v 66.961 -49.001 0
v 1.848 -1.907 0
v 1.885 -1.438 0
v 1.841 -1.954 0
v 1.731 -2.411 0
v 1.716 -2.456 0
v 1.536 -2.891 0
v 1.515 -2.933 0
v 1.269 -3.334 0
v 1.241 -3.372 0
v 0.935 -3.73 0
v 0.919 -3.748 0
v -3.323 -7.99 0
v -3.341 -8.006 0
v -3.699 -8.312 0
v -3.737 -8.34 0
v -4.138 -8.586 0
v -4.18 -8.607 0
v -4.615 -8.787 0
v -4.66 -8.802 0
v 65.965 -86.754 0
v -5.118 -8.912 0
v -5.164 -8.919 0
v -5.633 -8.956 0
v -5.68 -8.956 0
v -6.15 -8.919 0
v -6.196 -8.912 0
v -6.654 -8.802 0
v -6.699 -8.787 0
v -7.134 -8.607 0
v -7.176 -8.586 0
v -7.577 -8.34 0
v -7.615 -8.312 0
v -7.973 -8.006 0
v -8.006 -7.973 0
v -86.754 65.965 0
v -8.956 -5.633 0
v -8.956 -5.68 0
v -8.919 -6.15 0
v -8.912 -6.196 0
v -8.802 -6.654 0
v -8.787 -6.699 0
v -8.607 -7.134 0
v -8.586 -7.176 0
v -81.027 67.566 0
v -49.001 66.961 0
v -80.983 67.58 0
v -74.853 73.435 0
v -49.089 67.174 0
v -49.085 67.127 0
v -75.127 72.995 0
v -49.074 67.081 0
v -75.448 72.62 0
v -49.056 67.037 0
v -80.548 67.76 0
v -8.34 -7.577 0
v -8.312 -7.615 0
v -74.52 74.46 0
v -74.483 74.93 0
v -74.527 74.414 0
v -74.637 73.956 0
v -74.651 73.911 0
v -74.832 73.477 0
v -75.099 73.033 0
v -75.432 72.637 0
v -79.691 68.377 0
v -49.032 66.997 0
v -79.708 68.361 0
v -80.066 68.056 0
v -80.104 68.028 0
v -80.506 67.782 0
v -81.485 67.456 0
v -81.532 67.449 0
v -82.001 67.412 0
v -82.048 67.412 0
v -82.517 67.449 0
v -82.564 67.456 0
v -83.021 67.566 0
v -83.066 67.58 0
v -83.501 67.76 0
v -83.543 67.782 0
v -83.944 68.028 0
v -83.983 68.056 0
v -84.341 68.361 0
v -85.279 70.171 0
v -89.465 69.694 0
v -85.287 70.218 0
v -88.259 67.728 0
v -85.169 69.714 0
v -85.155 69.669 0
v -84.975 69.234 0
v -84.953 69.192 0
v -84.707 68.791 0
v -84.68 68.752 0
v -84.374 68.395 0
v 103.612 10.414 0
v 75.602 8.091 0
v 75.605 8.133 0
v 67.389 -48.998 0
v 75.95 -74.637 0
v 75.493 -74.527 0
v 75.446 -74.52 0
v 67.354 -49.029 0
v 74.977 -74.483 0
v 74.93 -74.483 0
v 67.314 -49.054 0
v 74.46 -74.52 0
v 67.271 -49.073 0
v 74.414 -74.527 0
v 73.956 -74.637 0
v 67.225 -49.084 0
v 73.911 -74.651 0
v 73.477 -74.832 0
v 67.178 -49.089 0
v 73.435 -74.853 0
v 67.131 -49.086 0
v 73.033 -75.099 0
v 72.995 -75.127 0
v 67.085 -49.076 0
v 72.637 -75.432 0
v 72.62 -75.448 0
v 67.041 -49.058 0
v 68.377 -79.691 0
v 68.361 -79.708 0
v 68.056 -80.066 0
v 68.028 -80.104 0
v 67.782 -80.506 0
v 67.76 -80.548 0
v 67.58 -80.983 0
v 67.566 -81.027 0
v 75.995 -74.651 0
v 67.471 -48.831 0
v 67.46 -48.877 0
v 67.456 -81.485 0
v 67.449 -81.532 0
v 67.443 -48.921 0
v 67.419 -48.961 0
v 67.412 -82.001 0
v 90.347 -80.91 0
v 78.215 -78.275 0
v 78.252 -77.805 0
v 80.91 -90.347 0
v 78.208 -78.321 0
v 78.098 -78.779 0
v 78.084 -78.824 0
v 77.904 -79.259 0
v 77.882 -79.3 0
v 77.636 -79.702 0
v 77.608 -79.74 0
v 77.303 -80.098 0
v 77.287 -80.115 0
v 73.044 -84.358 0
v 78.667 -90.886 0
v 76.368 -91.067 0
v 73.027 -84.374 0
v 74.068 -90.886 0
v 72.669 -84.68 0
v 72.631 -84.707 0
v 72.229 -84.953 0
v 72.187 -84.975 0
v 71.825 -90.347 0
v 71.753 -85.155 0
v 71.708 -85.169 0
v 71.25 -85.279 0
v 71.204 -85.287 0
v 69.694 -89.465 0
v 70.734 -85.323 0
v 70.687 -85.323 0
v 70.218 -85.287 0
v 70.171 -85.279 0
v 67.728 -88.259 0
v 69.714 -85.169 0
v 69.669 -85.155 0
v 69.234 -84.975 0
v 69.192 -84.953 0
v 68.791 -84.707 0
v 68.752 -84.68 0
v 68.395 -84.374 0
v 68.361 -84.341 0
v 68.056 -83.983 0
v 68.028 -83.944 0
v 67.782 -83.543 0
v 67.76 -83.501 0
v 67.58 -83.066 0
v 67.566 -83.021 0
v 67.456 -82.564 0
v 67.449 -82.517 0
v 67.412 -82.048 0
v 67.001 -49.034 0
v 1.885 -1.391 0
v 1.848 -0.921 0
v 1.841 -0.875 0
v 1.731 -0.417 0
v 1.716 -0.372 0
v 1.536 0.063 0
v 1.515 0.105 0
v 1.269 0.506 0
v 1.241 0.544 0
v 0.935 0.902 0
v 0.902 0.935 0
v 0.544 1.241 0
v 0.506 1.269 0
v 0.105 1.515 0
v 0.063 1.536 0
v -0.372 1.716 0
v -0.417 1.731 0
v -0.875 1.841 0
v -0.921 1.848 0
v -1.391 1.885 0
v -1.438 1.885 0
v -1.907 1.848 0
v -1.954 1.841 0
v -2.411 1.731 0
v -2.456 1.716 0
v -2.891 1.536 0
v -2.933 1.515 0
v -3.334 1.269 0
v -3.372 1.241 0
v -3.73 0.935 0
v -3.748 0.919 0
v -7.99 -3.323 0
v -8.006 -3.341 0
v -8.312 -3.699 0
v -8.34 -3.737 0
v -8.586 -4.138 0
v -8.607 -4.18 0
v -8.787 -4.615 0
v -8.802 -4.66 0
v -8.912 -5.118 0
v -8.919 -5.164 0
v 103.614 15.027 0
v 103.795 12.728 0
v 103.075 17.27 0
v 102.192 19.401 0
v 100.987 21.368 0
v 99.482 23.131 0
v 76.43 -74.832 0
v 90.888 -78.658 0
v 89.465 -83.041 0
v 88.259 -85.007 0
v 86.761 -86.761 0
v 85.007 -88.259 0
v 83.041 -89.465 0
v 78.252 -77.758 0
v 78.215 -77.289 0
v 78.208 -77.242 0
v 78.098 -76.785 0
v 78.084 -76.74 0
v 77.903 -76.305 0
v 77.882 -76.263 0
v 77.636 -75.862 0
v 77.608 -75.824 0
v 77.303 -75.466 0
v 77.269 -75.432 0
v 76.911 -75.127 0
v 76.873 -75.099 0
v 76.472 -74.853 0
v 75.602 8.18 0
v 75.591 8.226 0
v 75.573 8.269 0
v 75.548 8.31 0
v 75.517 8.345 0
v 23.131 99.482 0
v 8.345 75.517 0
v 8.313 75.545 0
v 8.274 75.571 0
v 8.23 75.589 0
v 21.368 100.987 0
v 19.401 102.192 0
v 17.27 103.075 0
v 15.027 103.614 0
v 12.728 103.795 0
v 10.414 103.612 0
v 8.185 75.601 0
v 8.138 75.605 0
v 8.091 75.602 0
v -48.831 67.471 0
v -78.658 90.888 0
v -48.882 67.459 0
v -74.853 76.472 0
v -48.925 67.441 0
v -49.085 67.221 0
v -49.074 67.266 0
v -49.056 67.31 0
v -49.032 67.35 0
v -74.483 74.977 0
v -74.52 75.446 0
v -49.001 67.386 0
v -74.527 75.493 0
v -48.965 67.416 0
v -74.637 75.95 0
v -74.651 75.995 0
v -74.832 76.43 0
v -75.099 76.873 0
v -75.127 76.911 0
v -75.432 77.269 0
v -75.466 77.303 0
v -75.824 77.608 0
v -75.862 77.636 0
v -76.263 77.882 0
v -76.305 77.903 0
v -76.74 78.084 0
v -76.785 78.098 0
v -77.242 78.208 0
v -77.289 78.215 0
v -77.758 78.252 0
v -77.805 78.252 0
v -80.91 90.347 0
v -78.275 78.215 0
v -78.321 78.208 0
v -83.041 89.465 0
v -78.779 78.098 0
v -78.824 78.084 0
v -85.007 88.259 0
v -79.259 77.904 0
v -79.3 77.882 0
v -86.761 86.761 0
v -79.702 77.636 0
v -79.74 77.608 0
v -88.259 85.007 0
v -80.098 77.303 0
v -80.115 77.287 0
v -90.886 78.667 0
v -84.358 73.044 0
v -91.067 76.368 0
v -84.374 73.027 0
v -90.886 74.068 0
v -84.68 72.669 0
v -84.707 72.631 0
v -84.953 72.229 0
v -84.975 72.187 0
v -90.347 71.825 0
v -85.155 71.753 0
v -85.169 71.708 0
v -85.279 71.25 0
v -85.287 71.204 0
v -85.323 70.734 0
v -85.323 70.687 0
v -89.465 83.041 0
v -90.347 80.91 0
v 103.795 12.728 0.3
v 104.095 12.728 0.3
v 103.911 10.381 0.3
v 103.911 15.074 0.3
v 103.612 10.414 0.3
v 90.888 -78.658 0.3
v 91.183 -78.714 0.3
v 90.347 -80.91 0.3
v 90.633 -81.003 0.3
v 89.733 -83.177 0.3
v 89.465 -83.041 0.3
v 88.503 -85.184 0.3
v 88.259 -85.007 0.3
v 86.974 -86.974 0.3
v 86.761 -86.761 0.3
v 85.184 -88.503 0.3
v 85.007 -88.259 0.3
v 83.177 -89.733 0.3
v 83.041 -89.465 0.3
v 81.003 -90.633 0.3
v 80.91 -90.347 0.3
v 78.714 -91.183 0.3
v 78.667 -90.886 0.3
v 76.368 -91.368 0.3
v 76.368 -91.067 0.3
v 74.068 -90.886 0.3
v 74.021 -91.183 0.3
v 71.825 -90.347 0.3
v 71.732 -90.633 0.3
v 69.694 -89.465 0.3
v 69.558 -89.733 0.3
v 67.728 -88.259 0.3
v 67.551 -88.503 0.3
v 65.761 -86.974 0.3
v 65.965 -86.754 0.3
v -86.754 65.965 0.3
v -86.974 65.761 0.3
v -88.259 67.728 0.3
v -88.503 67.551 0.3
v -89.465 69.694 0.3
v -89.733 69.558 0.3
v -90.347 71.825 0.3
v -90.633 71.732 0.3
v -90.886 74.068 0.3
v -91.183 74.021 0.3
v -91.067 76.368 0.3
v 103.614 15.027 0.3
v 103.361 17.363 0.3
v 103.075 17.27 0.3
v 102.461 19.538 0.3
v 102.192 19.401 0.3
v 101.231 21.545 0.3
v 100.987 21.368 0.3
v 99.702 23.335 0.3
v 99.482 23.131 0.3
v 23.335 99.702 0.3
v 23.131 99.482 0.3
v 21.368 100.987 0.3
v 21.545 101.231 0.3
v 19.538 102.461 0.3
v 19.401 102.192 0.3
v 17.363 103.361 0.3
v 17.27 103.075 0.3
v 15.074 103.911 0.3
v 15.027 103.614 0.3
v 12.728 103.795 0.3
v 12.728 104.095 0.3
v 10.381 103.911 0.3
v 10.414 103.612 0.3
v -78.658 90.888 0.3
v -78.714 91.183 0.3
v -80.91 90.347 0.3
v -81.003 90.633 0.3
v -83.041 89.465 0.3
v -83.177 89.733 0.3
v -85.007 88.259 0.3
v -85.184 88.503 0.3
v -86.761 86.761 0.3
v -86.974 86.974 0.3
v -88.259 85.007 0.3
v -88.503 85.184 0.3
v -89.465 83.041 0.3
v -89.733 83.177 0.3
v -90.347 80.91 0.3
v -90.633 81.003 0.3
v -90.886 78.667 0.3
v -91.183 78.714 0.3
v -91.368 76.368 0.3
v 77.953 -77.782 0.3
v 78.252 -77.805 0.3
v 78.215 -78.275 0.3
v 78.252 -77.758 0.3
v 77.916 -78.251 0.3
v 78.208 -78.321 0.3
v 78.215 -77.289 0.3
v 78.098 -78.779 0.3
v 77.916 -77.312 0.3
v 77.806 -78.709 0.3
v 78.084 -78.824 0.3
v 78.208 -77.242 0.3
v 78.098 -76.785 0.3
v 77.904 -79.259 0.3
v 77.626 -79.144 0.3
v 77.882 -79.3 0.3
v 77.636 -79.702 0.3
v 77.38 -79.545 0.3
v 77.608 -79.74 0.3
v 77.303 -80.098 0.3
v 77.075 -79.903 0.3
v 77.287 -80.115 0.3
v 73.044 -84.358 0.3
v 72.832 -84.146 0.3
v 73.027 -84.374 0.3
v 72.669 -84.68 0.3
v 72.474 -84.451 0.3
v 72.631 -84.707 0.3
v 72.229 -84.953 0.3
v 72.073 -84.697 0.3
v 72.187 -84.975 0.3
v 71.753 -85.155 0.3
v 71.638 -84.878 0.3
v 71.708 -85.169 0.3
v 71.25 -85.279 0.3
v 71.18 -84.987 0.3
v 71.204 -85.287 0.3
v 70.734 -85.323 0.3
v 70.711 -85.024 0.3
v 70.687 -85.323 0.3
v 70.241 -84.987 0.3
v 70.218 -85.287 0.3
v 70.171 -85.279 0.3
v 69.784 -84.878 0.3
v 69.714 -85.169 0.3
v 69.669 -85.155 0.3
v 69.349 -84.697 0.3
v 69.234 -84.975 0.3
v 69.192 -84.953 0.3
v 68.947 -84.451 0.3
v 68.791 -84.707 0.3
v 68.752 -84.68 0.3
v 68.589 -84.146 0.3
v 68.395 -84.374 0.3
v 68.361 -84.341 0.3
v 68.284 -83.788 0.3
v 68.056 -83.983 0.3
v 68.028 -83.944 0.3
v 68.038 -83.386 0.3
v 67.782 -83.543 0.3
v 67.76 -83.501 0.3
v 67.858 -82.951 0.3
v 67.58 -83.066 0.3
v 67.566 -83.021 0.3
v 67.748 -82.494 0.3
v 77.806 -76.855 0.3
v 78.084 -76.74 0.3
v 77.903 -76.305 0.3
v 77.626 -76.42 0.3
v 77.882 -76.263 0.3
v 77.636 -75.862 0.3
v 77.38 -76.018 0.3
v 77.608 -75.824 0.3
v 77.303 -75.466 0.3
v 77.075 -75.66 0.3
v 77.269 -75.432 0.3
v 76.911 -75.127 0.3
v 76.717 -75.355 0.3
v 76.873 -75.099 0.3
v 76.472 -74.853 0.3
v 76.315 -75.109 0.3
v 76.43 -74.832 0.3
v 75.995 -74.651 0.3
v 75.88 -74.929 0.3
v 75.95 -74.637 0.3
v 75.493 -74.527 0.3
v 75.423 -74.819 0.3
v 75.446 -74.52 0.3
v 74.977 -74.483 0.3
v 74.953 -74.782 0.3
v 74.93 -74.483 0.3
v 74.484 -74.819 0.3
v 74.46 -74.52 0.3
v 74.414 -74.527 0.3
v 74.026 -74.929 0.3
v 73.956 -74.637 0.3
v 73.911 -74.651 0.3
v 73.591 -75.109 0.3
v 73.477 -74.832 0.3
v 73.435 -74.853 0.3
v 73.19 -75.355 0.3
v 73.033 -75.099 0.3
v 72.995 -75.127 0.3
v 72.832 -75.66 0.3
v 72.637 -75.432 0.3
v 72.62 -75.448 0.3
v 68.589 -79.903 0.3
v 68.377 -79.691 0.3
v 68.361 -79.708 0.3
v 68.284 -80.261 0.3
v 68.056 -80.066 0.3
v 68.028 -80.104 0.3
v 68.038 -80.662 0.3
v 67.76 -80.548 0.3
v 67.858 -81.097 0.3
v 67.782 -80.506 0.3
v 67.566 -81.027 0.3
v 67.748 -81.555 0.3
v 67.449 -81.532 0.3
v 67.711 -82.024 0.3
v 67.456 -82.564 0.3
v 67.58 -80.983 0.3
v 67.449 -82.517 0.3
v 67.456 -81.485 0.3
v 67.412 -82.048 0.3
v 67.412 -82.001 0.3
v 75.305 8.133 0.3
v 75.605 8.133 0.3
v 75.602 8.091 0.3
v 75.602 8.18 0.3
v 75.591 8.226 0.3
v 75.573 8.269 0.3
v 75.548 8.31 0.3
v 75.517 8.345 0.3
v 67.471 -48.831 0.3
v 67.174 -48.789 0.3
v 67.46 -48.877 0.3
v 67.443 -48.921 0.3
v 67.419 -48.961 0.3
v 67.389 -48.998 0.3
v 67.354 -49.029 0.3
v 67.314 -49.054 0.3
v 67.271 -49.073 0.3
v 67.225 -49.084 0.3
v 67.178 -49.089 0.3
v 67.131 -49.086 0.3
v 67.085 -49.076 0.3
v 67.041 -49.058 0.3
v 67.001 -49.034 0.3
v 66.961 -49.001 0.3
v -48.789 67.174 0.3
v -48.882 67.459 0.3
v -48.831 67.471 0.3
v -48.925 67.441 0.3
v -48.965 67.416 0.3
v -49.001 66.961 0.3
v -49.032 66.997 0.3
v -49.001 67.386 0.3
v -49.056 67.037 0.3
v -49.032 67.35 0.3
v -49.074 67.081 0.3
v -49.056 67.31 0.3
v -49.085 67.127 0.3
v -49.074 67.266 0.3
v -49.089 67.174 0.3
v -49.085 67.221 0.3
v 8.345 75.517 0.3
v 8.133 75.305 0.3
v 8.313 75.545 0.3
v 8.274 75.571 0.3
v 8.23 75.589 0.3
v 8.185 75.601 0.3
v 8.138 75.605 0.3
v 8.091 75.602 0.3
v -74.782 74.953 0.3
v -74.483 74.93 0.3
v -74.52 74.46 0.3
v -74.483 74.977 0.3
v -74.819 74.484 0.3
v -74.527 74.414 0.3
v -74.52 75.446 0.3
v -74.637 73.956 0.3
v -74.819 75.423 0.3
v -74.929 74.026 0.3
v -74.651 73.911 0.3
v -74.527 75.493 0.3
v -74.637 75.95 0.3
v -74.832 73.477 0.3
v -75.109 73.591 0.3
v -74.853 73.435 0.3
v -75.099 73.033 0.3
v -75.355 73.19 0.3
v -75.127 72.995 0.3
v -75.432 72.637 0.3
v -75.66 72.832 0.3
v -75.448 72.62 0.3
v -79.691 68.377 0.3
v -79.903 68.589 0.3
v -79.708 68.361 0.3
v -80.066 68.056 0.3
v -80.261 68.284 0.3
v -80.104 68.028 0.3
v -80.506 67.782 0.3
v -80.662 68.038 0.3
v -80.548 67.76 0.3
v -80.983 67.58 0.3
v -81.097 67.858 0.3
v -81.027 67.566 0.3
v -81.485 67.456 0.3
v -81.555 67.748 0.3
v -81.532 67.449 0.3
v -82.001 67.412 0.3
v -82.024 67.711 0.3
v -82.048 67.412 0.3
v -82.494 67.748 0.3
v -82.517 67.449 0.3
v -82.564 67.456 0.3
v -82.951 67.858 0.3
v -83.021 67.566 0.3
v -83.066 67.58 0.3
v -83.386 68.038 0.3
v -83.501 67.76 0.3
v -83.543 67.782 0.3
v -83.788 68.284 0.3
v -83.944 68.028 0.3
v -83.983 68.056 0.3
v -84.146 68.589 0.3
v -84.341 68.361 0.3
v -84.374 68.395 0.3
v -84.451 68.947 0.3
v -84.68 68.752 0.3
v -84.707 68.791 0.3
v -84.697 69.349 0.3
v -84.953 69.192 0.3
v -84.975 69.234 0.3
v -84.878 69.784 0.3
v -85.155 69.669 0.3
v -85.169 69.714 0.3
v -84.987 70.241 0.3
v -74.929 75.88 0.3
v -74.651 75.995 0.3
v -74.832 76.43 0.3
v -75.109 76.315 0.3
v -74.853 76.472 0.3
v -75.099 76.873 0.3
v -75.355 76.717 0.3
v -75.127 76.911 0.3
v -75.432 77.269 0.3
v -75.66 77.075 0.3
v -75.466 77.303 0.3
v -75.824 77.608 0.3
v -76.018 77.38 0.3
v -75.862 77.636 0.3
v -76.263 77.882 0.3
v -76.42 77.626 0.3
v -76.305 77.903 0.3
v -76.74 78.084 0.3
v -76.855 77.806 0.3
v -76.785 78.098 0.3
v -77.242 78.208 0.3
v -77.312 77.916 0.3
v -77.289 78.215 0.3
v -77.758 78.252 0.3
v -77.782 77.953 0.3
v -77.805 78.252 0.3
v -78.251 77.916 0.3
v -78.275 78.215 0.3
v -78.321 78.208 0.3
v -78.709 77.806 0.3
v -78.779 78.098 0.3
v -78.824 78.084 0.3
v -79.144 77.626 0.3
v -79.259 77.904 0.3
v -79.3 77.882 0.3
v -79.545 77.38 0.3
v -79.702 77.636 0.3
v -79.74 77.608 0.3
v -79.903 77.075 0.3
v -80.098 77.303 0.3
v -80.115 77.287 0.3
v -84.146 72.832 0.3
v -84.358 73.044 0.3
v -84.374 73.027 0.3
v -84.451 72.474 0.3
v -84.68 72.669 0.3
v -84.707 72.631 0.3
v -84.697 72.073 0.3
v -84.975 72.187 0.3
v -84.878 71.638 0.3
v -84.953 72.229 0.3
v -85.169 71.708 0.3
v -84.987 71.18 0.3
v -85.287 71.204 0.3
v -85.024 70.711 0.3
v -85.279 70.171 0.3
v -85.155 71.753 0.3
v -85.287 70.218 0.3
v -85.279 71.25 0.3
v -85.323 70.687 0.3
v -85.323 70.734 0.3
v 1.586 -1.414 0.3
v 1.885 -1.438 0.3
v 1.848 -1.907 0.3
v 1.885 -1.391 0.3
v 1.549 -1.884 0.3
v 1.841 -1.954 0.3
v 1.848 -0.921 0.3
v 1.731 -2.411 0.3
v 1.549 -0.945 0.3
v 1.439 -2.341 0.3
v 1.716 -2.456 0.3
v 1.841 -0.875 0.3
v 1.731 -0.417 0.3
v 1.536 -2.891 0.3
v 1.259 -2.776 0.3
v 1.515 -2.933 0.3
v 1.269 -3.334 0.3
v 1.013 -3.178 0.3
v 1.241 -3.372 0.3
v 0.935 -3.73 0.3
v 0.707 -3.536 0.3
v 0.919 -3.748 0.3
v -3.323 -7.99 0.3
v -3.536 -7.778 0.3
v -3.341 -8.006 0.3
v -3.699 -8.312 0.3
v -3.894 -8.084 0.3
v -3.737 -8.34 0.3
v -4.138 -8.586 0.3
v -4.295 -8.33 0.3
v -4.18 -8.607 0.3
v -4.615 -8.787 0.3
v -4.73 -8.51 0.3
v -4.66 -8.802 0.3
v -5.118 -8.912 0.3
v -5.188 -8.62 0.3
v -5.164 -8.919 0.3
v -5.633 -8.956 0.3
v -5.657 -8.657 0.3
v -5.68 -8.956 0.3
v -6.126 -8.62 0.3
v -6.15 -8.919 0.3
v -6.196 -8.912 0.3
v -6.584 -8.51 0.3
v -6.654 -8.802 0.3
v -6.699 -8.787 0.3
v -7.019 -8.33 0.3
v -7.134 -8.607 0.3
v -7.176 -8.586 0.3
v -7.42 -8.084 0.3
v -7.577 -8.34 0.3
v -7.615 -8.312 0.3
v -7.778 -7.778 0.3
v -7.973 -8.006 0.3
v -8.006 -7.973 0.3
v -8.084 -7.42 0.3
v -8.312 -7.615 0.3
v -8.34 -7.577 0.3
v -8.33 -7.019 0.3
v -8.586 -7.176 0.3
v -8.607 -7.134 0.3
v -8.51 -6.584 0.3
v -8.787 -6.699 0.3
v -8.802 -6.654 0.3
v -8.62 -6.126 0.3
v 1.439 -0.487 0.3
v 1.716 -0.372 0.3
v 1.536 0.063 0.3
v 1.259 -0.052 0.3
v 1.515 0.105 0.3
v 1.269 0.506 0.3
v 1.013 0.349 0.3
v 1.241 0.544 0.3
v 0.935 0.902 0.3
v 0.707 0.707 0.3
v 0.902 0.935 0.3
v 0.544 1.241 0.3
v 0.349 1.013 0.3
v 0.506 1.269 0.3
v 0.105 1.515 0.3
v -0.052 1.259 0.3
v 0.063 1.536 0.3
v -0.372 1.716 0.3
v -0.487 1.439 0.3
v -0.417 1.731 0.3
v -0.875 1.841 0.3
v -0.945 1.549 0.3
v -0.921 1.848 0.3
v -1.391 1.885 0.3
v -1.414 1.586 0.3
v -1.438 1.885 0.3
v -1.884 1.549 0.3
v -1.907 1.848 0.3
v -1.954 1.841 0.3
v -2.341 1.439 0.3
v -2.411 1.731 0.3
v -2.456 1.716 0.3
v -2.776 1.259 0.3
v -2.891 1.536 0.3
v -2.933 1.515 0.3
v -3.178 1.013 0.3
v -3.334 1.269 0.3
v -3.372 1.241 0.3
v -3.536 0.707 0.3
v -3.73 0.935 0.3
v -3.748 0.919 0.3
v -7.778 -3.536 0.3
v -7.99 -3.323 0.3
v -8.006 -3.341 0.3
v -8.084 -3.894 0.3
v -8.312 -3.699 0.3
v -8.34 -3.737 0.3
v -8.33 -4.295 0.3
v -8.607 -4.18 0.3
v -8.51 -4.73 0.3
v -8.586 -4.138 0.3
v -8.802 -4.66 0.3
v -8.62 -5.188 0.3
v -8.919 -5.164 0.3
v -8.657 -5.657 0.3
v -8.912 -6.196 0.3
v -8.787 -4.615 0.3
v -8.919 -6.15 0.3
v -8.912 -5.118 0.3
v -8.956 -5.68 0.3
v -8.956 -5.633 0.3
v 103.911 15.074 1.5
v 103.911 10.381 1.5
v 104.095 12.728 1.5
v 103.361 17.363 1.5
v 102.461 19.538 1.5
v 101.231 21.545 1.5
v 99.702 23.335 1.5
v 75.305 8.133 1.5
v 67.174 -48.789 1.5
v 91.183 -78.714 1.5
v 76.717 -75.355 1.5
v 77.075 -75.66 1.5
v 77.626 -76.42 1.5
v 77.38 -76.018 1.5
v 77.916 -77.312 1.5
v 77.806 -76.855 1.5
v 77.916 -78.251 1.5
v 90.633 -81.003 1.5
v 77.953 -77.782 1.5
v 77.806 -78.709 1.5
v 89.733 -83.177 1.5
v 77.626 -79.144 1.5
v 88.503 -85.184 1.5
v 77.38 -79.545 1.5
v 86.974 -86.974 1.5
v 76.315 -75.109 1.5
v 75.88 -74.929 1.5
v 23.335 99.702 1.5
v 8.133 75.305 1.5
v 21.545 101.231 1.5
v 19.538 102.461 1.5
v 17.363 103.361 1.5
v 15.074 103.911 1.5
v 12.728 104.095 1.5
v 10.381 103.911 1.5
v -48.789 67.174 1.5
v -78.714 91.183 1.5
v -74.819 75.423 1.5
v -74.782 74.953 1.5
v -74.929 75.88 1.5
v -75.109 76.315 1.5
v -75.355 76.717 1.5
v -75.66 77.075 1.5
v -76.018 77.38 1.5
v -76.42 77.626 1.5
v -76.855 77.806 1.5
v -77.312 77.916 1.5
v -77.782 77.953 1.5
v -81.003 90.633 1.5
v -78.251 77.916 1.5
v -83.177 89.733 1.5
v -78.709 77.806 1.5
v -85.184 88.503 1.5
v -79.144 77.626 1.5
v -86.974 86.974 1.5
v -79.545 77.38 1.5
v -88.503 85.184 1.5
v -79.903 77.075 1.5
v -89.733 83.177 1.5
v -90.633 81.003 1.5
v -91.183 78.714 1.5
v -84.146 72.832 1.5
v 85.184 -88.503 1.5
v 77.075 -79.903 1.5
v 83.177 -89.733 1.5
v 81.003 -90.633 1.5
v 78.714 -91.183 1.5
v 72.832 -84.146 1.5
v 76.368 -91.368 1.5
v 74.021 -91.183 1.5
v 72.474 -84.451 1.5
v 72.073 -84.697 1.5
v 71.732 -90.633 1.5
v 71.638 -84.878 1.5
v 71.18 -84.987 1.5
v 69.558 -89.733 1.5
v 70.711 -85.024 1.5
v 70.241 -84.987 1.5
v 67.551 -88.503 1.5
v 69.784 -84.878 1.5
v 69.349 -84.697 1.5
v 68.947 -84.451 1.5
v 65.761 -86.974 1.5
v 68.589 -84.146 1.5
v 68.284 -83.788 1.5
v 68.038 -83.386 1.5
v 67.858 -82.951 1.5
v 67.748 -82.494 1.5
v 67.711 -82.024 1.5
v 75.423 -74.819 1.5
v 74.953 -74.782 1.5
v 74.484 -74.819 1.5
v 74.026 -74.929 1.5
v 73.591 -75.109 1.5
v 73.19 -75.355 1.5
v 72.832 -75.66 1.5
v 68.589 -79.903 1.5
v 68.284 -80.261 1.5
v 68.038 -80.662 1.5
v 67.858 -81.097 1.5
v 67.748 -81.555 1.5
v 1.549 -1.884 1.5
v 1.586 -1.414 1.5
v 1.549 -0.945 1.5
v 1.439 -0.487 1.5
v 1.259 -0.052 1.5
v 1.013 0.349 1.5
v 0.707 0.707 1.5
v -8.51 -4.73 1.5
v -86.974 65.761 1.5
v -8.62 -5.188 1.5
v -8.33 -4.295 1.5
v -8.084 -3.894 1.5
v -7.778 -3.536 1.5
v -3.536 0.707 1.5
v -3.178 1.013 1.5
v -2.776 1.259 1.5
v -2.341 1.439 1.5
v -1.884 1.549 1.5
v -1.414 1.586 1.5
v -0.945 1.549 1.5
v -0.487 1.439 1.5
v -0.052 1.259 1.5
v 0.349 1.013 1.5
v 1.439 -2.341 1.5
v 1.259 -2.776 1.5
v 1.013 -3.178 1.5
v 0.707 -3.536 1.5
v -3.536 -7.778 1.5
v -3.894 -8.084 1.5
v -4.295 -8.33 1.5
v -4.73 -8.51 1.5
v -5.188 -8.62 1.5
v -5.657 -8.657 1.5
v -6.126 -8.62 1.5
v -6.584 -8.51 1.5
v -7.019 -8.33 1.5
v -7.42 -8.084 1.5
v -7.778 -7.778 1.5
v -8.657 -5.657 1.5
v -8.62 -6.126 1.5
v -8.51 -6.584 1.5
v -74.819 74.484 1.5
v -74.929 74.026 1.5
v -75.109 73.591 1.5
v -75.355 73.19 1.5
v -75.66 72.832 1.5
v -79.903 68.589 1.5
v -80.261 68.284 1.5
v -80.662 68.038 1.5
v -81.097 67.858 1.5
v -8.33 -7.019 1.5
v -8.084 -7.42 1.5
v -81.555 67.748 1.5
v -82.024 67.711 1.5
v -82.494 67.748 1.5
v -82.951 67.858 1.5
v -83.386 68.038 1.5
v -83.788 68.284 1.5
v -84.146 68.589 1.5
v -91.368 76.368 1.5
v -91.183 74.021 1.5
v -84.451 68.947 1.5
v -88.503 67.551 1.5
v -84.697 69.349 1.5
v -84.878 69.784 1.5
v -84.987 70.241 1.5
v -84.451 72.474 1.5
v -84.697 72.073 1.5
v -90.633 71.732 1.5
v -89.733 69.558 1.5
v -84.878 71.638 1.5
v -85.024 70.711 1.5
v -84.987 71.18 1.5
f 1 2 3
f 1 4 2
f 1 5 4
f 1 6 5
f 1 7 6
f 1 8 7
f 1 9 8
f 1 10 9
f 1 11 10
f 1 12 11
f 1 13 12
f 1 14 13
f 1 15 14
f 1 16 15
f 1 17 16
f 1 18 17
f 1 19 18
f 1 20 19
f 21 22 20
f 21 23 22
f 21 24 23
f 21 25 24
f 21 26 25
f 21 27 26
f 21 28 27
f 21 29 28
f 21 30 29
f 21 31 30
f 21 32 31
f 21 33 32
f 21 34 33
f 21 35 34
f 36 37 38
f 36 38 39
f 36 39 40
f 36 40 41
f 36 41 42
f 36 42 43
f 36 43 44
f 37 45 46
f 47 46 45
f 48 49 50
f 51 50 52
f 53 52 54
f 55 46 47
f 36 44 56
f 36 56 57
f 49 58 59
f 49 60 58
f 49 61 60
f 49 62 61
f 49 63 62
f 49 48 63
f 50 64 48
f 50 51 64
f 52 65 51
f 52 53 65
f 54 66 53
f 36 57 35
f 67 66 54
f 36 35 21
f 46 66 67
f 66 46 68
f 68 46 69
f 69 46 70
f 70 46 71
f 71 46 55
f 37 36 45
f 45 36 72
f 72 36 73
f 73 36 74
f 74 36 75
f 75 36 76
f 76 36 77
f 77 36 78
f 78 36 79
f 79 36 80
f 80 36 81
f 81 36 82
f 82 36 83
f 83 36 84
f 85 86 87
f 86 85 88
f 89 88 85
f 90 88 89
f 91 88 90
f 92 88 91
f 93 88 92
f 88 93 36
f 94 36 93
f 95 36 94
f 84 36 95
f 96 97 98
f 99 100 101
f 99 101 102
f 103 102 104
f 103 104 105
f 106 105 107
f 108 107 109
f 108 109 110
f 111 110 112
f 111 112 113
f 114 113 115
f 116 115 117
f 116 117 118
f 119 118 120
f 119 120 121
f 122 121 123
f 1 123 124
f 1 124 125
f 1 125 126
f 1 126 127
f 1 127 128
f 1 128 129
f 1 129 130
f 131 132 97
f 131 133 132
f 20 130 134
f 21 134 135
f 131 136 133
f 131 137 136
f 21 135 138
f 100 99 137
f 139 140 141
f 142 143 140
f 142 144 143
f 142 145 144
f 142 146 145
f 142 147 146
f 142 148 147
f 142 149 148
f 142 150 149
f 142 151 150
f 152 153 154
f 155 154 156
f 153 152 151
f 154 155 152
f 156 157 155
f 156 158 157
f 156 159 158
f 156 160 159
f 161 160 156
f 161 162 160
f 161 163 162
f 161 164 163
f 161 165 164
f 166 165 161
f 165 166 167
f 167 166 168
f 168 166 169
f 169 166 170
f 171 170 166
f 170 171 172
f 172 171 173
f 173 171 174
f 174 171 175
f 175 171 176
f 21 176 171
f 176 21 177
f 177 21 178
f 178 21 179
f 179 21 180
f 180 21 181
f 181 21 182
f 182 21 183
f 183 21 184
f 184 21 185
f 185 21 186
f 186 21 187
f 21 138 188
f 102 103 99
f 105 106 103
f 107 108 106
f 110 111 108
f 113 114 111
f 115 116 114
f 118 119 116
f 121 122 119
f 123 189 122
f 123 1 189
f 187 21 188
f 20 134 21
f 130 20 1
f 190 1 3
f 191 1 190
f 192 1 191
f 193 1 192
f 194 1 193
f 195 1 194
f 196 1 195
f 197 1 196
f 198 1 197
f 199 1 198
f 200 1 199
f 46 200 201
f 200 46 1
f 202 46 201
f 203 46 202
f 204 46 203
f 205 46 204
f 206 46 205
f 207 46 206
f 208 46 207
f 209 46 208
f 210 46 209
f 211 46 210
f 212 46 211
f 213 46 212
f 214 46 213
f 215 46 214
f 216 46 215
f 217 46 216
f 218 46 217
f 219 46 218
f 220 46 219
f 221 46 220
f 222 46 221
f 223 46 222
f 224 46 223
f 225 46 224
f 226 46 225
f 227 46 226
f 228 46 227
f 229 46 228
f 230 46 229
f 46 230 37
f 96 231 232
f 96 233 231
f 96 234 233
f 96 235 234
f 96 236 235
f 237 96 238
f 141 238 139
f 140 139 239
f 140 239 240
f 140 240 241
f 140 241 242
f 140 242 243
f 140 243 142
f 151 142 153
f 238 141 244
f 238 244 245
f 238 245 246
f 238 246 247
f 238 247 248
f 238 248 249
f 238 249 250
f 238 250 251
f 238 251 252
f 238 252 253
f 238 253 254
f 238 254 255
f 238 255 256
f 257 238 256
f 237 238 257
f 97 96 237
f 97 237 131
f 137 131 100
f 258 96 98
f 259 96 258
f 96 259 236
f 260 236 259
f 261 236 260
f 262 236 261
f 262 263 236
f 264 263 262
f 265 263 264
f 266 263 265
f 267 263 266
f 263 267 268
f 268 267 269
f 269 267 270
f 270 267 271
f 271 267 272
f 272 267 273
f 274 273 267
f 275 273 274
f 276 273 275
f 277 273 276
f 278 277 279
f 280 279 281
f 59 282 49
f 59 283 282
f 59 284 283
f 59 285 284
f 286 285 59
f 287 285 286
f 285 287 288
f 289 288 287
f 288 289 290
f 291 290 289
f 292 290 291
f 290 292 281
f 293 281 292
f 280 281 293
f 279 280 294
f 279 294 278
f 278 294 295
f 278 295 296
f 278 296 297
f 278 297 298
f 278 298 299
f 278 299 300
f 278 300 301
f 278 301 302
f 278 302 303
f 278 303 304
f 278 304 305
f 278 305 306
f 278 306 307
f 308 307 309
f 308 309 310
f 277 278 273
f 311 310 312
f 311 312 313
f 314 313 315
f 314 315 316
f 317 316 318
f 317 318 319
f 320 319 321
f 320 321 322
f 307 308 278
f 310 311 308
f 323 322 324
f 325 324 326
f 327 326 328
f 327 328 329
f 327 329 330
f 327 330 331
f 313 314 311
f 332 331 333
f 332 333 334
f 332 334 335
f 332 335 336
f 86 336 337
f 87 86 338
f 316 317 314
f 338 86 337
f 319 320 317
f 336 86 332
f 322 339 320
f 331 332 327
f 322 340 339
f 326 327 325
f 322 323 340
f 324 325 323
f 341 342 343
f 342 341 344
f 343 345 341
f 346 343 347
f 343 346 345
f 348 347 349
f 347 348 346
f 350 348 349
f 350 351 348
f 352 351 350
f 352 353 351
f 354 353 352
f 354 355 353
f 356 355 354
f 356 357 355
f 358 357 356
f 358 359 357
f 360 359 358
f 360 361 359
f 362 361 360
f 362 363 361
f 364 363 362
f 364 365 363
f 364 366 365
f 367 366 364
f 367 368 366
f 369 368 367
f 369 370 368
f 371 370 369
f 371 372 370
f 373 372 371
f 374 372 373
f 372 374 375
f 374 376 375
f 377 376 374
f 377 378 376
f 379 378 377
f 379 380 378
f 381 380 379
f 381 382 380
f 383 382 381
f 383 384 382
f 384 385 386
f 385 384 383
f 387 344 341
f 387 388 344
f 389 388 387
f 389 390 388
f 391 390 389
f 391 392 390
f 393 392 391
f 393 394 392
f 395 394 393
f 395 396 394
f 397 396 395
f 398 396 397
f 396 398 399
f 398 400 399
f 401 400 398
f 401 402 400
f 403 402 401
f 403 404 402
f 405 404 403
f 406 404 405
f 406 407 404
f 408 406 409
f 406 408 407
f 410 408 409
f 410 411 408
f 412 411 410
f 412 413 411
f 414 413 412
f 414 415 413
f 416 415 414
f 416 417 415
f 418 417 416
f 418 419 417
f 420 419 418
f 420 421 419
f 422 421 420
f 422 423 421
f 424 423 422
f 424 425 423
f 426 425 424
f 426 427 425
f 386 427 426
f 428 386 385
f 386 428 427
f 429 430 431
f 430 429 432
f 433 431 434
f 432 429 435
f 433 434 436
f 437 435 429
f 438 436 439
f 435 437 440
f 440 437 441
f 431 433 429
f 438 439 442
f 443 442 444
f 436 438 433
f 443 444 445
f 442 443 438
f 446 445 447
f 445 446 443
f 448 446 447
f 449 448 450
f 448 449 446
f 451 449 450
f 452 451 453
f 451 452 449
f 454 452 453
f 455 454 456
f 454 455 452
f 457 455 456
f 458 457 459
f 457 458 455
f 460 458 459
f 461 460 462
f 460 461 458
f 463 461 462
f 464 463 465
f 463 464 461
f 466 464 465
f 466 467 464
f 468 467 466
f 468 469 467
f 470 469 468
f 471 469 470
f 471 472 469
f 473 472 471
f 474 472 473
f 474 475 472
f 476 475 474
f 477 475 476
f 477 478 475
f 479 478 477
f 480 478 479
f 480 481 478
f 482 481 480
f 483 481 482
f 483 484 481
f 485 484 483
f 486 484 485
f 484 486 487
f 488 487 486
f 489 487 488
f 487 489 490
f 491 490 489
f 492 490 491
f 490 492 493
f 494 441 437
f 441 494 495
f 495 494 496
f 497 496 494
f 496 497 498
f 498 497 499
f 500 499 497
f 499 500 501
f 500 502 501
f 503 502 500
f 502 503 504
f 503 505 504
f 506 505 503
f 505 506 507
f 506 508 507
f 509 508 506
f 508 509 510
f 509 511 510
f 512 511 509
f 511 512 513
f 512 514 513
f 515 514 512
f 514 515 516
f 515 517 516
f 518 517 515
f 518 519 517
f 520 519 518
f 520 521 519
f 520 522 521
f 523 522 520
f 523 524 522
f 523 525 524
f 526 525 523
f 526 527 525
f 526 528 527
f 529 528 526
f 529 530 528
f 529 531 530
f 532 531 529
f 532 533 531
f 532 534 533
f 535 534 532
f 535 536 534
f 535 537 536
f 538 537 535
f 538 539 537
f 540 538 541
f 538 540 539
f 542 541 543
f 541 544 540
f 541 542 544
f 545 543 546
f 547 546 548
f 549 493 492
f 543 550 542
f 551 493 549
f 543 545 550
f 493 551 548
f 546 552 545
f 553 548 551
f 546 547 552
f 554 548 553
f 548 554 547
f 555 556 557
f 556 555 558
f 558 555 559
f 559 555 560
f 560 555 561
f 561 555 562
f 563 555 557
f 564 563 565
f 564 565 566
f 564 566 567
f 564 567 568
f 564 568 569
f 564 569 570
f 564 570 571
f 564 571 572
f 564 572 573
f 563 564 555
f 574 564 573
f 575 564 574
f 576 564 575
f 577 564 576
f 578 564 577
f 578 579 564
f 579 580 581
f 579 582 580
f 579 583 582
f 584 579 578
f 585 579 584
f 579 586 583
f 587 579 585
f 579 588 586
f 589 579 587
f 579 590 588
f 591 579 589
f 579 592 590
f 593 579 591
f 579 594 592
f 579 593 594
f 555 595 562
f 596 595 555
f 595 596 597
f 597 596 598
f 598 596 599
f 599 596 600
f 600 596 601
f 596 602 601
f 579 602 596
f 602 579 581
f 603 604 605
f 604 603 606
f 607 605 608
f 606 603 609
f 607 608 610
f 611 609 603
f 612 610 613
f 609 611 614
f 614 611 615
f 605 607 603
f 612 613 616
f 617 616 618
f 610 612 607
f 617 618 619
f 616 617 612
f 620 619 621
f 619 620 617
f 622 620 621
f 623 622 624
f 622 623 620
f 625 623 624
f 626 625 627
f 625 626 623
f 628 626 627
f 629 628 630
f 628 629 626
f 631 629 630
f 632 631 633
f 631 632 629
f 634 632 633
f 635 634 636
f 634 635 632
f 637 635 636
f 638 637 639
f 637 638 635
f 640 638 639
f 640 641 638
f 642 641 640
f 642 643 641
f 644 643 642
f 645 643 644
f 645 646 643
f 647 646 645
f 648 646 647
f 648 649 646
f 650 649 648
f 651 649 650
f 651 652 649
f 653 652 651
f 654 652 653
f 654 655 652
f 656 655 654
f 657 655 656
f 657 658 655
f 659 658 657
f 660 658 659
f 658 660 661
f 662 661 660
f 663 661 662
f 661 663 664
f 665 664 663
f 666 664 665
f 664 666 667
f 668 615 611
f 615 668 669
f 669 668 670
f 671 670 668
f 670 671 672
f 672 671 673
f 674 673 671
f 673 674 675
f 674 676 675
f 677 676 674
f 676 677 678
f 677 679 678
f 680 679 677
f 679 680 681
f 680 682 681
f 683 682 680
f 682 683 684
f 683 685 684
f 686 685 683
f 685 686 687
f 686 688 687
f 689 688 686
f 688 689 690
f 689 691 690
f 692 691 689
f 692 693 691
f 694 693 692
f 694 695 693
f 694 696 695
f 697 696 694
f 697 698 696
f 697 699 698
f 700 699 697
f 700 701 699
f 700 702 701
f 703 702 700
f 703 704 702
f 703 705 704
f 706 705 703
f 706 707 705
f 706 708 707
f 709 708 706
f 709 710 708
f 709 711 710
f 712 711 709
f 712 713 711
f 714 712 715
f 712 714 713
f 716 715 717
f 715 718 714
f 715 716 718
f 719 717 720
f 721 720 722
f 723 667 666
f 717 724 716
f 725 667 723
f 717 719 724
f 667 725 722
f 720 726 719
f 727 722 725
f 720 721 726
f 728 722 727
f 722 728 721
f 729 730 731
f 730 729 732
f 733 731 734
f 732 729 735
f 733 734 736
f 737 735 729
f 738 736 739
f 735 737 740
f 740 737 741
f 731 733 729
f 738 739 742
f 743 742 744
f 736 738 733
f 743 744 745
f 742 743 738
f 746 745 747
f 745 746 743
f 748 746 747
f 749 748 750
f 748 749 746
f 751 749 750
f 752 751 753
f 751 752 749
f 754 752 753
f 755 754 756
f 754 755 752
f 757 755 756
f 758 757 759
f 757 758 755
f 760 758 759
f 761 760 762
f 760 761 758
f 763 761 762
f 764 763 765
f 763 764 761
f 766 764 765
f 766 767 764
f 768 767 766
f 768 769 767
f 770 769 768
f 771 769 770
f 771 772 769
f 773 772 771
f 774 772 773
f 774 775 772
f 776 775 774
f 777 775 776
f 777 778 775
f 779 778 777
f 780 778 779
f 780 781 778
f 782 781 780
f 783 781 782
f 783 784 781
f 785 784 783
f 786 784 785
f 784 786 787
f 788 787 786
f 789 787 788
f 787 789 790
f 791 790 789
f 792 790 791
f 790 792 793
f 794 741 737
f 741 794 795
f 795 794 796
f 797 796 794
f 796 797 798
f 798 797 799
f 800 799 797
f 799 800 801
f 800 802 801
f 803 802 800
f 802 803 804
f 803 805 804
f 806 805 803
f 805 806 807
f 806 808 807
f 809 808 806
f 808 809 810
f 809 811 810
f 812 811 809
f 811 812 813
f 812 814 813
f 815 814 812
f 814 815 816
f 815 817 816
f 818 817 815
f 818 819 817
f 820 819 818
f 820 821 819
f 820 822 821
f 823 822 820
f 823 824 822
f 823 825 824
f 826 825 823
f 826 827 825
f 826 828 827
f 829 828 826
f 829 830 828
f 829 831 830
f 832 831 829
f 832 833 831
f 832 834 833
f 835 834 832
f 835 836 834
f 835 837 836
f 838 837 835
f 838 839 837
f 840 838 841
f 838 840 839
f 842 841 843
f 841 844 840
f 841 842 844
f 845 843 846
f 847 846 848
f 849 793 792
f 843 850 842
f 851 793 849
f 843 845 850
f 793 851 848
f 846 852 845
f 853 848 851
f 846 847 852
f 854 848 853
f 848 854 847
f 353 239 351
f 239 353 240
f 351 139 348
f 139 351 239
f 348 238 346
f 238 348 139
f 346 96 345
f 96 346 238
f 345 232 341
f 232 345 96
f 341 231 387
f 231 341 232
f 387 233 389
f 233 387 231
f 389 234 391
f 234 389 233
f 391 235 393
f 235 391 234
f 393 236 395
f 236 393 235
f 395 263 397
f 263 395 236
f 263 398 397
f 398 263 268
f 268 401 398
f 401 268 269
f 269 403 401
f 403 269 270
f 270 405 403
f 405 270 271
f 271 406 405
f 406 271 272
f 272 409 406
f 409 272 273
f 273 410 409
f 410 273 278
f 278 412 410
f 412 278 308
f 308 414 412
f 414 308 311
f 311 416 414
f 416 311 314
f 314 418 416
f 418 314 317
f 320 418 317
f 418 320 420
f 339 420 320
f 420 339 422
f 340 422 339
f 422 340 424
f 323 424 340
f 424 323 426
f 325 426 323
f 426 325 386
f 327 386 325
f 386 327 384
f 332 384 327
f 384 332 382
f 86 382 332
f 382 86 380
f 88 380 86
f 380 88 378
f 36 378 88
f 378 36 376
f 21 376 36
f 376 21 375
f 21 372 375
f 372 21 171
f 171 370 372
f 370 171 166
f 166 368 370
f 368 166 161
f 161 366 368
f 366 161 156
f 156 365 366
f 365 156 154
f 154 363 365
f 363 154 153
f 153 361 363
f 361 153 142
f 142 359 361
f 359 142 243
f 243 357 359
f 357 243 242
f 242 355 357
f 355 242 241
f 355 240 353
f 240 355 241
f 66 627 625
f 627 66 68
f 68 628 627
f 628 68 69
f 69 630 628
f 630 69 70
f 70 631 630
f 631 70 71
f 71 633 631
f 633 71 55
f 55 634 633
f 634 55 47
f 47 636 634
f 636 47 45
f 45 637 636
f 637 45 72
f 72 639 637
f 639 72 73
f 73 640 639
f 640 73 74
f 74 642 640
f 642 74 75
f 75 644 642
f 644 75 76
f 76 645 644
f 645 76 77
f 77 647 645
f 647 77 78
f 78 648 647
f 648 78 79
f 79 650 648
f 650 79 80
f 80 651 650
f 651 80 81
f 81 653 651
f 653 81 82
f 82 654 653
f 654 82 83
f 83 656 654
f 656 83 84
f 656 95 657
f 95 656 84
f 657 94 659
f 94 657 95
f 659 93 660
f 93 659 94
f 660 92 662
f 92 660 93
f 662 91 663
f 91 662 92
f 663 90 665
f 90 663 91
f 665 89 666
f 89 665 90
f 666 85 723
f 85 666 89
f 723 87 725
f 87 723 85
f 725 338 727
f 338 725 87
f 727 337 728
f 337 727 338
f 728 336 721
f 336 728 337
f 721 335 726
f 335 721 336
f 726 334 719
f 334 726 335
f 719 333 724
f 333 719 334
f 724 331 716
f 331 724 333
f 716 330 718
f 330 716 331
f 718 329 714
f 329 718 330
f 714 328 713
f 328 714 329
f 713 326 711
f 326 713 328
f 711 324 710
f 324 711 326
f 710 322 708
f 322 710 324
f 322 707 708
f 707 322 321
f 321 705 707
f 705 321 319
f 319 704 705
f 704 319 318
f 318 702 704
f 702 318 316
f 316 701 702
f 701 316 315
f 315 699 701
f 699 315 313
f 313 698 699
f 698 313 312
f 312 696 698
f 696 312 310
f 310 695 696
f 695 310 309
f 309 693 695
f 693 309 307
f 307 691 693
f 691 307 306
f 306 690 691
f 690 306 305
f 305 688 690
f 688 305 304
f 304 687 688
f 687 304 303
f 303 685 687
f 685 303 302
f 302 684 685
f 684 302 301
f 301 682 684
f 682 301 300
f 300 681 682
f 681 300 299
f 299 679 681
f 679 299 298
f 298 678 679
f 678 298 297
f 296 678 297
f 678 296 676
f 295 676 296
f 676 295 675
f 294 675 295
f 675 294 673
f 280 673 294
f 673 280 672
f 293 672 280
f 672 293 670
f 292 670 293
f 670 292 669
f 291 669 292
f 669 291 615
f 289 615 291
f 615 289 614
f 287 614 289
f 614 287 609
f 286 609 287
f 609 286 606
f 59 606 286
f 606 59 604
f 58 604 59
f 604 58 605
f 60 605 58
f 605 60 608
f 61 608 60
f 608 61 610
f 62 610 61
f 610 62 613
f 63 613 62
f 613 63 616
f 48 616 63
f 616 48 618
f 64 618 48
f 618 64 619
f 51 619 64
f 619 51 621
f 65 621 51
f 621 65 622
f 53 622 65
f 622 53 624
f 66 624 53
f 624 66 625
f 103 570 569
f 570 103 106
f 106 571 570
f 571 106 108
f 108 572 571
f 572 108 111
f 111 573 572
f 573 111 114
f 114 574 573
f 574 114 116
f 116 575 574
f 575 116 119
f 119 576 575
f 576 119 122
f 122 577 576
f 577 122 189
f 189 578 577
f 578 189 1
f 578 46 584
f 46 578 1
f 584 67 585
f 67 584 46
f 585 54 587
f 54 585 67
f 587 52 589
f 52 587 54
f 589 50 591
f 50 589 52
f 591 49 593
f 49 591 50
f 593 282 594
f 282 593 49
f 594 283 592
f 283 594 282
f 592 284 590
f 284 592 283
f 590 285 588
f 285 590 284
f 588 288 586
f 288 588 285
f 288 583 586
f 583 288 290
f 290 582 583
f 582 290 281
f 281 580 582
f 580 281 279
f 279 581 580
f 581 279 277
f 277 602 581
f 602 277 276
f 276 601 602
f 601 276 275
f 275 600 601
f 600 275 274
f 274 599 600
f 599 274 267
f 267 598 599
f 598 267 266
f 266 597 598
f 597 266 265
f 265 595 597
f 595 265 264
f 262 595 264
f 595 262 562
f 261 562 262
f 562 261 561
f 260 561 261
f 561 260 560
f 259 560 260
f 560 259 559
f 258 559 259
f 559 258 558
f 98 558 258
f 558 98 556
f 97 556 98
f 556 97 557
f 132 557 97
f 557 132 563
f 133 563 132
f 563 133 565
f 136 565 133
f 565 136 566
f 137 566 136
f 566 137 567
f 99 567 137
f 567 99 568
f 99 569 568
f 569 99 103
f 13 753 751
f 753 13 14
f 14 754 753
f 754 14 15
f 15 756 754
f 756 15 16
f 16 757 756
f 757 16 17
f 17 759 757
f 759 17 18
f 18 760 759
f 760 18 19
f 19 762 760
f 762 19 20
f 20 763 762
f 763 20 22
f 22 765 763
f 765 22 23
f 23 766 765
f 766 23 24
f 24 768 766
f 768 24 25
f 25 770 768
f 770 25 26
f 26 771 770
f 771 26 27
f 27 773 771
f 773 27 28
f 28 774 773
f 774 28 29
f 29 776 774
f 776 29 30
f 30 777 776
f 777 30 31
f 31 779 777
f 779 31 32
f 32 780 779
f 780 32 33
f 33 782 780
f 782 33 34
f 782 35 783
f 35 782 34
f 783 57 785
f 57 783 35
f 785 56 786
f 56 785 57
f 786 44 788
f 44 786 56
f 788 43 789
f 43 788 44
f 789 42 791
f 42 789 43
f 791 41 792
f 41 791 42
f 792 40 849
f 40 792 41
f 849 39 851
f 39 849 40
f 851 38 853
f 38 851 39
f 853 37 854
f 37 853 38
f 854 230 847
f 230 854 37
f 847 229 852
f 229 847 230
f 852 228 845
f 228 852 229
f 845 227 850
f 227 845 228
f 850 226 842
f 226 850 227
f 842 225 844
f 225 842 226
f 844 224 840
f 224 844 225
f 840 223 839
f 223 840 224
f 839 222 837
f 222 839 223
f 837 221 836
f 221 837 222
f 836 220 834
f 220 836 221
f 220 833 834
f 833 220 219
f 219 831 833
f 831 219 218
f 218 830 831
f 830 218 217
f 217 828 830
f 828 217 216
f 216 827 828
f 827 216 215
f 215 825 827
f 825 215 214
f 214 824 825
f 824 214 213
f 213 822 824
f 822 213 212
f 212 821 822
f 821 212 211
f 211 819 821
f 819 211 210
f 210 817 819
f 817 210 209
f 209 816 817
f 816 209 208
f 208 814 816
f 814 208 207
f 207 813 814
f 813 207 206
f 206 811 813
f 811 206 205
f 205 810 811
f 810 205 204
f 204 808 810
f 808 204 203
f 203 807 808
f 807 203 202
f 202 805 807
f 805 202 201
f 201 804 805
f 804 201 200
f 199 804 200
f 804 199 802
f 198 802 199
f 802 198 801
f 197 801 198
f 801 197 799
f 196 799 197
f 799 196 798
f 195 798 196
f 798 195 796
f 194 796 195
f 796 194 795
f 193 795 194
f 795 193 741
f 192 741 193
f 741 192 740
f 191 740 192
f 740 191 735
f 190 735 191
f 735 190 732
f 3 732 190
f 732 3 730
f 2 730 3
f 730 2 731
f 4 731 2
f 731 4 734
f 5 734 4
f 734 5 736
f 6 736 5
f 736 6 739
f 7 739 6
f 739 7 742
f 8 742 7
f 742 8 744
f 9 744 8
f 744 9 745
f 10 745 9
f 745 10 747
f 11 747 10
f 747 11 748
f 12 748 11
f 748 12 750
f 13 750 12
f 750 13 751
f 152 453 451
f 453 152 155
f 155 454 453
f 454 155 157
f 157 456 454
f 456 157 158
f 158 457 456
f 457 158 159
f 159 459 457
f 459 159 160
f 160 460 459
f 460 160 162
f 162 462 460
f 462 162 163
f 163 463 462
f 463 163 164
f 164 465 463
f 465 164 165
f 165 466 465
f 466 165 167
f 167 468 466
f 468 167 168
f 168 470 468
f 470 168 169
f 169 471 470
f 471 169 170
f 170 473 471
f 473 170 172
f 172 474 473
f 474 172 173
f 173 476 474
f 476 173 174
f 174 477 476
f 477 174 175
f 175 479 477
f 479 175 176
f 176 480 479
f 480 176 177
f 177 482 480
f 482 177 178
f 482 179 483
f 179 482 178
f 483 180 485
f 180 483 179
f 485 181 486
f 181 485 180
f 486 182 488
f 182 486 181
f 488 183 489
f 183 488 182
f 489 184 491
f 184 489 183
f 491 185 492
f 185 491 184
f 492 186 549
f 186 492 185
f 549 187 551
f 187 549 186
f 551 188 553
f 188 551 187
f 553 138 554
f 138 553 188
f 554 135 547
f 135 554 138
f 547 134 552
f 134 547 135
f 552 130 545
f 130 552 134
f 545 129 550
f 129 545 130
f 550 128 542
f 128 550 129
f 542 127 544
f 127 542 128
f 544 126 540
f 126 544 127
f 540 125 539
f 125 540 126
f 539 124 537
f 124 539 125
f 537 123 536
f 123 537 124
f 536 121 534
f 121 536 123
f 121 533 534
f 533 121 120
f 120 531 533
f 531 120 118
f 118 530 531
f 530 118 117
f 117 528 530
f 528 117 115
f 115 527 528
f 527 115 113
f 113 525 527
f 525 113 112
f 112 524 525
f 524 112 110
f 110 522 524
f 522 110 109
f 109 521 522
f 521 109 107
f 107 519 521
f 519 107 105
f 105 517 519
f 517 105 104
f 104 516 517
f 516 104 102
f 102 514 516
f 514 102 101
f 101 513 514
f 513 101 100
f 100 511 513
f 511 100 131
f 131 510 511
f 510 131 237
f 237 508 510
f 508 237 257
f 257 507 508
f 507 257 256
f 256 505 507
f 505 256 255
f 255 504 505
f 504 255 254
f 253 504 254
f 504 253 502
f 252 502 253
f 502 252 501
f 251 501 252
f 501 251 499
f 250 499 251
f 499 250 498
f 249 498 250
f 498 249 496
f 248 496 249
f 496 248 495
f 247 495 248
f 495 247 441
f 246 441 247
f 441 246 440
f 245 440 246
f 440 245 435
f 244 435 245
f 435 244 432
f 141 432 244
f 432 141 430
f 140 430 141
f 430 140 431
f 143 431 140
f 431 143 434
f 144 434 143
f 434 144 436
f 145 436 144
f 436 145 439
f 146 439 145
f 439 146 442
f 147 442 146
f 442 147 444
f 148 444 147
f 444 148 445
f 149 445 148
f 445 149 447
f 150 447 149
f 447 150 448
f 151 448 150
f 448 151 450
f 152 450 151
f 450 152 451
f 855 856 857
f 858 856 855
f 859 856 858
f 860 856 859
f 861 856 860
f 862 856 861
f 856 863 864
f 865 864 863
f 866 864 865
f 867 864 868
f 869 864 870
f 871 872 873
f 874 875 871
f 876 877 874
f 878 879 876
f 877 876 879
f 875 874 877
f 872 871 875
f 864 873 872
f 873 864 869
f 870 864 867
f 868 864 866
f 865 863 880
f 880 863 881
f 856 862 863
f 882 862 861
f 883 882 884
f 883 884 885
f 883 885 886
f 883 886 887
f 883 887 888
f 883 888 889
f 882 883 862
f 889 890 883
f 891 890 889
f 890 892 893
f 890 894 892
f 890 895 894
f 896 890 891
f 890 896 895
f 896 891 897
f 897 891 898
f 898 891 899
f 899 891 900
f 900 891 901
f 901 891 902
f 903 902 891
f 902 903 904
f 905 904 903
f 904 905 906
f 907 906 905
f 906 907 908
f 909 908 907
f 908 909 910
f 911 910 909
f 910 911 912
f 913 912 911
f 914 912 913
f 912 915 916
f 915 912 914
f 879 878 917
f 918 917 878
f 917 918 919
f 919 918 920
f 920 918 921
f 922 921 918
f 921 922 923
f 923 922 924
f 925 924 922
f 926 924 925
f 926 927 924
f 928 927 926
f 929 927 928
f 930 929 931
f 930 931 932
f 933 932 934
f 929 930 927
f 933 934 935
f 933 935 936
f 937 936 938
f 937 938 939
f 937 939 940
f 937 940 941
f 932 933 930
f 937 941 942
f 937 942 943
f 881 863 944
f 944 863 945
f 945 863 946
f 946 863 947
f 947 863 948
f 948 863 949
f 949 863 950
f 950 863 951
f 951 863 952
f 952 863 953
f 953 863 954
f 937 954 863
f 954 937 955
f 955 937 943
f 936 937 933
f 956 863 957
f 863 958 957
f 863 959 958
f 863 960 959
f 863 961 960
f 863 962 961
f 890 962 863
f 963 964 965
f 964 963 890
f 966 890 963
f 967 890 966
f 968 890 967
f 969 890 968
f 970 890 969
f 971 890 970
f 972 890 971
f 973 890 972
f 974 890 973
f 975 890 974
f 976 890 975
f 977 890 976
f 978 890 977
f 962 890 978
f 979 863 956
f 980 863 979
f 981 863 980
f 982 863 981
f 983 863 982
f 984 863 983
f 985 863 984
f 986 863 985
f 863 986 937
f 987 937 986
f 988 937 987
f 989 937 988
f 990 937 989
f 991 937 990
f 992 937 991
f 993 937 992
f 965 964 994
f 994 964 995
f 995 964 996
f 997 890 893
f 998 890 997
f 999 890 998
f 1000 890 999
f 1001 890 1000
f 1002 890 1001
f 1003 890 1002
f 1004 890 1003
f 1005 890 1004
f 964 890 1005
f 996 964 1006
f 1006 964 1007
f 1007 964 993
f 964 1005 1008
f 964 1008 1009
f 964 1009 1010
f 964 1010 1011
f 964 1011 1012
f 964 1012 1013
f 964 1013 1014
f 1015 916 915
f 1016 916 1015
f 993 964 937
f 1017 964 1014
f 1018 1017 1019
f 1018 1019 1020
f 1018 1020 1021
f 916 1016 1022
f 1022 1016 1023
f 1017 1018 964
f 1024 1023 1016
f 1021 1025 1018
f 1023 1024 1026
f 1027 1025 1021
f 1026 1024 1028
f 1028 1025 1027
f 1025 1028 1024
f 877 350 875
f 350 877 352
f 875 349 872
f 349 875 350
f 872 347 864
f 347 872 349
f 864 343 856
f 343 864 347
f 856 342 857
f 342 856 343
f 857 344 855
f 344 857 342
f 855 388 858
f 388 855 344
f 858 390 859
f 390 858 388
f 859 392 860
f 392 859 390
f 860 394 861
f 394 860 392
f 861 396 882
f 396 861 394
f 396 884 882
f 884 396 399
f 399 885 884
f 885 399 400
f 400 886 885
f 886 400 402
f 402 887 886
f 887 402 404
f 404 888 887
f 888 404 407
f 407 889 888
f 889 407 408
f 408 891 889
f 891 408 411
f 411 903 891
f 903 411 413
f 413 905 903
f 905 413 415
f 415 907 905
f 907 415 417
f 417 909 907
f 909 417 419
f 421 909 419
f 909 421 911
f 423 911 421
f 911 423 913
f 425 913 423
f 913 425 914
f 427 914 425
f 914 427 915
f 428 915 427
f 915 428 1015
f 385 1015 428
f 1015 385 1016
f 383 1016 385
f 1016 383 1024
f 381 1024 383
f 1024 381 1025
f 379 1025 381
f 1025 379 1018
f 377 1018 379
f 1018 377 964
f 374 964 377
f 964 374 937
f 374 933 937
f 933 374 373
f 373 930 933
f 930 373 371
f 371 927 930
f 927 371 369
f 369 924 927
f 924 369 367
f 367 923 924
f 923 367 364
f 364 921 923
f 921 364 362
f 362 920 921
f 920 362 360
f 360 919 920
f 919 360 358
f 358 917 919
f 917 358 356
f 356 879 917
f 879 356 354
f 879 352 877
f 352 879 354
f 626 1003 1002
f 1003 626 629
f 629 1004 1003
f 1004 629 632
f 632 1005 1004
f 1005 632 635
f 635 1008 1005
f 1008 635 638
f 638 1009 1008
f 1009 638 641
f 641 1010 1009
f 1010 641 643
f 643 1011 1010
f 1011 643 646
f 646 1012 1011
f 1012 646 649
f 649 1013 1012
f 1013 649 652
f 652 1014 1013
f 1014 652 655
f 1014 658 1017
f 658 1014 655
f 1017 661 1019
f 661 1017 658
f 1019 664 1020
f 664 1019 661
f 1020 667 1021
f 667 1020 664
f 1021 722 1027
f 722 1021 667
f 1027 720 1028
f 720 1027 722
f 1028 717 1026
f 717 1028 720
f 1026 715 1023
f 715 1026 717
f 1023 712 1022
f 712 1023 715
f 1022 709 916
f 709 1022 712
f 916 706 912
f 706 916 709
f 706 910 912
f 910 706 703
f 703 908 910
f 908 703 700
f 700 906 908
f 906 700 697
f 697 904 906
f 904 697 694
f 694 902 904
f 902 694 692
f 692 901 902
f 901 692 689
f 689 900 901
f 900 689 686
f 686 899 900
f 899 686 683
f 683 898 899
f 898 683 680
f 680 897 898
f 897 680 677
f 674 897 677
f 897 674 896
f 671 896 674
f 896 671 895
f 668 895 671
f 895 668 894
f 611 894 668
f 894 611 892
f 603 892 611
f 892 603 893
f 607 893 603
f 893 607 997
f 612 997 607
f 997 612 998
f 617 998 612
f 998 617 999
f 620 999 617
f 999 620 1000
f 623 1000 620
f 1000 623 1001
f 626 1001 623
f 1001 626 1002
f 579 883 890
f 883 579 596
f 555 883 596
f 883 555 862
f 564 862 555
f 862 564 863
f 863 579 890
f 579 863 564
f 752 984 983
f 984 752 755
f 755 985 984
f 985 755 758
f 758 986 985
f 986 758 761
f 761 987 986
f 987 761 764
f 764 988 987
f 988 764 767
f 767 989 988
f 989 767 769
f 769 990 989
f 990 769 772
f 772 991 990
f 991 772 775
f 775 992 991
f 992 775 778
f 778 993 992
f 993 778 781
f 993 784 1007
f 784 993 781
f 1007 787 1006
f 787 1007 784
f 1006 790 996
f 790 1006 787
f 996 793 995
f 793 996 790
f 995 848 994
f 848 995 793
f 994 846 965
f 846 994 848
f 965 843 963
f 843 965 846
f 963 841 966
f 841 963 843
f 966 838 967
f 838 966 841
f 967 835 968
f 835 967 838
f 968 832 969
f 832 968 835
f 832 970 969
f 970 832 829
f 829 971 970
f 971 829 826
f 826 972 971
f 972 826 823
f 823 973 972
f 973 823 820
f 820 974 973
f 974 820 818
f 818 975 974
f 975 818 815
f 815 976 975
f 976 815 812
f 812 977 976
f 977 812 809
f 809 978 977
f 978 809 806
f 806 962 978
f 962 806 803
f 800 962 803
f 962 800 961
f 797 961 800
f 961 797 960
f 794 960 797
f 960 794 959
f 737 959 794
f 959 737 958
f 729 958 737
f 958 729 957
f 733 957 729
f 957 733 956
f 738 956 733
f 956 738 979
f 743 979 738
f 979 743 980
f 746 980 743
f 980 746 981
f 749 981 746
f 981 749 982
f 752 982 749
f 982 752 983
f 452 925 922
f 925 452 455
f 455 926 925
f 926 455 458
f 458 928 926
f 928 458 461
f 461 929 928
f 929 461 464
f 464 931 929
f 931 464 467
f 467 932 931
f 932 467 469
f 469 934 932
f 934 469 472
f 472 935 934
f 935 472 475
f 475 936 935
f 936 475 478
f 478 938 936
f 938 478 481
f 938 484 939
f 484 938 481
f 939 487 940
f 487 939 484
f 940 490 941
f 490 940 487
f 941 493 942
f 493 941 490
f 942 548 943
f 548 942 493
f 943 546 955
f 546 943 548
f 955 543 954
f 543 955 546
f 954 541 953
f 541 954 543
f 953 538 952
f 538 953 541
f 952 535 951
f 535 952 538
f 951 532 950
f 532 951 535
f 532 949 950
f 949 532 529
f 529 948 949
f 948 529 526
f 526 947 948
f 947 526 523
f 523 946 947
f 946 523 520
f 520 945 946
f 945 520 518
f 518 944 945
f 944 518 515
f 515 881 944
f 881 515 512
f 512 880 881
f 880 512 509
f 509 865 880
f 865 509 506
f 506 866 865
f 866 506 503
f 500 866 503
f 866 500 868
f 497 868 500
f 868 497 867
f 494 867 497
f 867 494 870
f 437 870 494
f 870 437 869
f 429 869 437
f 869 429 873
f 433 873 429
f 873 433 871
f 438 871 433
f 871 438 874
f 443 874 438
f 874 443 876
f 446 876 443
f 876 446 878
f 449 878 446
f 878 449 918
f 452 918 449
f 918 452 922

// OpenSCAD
// Use 0.3mm layers.

hole_spacing = 216;
$fn = 40;
height = 1.5;

module exterior_2d() {
  diam = 30;
  
  hull() {
    for (a = [-1, 1]) {
      translate([0, a*hole_spacing/2])
        circle(d=diam);
      
      translate([hole_spacing/3, a*hole_spacing/4])
        circle(d=diam);
    }
  }
}

module holes_2d() {
  for (a = [-1, 0, 1])
    translate([0, a*hole_spacing/2])
      hull()
        for (b = [-1, 0])
          translate([b*6-2, 0])
            circle(d=6);
}

module skeleton_2d() {
  difference() {
    exterior_2d();
    offset(-28)
      exterior_2d();
  }
}

module profile_2d() {
  difference() {
    skeleton_2d();
    holes_2d();
  }
}

module main() {
  rotate([0, 0, 45]) {
    linear_extrude(0.3)
      offset(-0.3)
        profile_2d();
    translate([0, 0, 0.3])
      linear_extrude(height-0.3)
        profile_2d();
  }
}

main();
